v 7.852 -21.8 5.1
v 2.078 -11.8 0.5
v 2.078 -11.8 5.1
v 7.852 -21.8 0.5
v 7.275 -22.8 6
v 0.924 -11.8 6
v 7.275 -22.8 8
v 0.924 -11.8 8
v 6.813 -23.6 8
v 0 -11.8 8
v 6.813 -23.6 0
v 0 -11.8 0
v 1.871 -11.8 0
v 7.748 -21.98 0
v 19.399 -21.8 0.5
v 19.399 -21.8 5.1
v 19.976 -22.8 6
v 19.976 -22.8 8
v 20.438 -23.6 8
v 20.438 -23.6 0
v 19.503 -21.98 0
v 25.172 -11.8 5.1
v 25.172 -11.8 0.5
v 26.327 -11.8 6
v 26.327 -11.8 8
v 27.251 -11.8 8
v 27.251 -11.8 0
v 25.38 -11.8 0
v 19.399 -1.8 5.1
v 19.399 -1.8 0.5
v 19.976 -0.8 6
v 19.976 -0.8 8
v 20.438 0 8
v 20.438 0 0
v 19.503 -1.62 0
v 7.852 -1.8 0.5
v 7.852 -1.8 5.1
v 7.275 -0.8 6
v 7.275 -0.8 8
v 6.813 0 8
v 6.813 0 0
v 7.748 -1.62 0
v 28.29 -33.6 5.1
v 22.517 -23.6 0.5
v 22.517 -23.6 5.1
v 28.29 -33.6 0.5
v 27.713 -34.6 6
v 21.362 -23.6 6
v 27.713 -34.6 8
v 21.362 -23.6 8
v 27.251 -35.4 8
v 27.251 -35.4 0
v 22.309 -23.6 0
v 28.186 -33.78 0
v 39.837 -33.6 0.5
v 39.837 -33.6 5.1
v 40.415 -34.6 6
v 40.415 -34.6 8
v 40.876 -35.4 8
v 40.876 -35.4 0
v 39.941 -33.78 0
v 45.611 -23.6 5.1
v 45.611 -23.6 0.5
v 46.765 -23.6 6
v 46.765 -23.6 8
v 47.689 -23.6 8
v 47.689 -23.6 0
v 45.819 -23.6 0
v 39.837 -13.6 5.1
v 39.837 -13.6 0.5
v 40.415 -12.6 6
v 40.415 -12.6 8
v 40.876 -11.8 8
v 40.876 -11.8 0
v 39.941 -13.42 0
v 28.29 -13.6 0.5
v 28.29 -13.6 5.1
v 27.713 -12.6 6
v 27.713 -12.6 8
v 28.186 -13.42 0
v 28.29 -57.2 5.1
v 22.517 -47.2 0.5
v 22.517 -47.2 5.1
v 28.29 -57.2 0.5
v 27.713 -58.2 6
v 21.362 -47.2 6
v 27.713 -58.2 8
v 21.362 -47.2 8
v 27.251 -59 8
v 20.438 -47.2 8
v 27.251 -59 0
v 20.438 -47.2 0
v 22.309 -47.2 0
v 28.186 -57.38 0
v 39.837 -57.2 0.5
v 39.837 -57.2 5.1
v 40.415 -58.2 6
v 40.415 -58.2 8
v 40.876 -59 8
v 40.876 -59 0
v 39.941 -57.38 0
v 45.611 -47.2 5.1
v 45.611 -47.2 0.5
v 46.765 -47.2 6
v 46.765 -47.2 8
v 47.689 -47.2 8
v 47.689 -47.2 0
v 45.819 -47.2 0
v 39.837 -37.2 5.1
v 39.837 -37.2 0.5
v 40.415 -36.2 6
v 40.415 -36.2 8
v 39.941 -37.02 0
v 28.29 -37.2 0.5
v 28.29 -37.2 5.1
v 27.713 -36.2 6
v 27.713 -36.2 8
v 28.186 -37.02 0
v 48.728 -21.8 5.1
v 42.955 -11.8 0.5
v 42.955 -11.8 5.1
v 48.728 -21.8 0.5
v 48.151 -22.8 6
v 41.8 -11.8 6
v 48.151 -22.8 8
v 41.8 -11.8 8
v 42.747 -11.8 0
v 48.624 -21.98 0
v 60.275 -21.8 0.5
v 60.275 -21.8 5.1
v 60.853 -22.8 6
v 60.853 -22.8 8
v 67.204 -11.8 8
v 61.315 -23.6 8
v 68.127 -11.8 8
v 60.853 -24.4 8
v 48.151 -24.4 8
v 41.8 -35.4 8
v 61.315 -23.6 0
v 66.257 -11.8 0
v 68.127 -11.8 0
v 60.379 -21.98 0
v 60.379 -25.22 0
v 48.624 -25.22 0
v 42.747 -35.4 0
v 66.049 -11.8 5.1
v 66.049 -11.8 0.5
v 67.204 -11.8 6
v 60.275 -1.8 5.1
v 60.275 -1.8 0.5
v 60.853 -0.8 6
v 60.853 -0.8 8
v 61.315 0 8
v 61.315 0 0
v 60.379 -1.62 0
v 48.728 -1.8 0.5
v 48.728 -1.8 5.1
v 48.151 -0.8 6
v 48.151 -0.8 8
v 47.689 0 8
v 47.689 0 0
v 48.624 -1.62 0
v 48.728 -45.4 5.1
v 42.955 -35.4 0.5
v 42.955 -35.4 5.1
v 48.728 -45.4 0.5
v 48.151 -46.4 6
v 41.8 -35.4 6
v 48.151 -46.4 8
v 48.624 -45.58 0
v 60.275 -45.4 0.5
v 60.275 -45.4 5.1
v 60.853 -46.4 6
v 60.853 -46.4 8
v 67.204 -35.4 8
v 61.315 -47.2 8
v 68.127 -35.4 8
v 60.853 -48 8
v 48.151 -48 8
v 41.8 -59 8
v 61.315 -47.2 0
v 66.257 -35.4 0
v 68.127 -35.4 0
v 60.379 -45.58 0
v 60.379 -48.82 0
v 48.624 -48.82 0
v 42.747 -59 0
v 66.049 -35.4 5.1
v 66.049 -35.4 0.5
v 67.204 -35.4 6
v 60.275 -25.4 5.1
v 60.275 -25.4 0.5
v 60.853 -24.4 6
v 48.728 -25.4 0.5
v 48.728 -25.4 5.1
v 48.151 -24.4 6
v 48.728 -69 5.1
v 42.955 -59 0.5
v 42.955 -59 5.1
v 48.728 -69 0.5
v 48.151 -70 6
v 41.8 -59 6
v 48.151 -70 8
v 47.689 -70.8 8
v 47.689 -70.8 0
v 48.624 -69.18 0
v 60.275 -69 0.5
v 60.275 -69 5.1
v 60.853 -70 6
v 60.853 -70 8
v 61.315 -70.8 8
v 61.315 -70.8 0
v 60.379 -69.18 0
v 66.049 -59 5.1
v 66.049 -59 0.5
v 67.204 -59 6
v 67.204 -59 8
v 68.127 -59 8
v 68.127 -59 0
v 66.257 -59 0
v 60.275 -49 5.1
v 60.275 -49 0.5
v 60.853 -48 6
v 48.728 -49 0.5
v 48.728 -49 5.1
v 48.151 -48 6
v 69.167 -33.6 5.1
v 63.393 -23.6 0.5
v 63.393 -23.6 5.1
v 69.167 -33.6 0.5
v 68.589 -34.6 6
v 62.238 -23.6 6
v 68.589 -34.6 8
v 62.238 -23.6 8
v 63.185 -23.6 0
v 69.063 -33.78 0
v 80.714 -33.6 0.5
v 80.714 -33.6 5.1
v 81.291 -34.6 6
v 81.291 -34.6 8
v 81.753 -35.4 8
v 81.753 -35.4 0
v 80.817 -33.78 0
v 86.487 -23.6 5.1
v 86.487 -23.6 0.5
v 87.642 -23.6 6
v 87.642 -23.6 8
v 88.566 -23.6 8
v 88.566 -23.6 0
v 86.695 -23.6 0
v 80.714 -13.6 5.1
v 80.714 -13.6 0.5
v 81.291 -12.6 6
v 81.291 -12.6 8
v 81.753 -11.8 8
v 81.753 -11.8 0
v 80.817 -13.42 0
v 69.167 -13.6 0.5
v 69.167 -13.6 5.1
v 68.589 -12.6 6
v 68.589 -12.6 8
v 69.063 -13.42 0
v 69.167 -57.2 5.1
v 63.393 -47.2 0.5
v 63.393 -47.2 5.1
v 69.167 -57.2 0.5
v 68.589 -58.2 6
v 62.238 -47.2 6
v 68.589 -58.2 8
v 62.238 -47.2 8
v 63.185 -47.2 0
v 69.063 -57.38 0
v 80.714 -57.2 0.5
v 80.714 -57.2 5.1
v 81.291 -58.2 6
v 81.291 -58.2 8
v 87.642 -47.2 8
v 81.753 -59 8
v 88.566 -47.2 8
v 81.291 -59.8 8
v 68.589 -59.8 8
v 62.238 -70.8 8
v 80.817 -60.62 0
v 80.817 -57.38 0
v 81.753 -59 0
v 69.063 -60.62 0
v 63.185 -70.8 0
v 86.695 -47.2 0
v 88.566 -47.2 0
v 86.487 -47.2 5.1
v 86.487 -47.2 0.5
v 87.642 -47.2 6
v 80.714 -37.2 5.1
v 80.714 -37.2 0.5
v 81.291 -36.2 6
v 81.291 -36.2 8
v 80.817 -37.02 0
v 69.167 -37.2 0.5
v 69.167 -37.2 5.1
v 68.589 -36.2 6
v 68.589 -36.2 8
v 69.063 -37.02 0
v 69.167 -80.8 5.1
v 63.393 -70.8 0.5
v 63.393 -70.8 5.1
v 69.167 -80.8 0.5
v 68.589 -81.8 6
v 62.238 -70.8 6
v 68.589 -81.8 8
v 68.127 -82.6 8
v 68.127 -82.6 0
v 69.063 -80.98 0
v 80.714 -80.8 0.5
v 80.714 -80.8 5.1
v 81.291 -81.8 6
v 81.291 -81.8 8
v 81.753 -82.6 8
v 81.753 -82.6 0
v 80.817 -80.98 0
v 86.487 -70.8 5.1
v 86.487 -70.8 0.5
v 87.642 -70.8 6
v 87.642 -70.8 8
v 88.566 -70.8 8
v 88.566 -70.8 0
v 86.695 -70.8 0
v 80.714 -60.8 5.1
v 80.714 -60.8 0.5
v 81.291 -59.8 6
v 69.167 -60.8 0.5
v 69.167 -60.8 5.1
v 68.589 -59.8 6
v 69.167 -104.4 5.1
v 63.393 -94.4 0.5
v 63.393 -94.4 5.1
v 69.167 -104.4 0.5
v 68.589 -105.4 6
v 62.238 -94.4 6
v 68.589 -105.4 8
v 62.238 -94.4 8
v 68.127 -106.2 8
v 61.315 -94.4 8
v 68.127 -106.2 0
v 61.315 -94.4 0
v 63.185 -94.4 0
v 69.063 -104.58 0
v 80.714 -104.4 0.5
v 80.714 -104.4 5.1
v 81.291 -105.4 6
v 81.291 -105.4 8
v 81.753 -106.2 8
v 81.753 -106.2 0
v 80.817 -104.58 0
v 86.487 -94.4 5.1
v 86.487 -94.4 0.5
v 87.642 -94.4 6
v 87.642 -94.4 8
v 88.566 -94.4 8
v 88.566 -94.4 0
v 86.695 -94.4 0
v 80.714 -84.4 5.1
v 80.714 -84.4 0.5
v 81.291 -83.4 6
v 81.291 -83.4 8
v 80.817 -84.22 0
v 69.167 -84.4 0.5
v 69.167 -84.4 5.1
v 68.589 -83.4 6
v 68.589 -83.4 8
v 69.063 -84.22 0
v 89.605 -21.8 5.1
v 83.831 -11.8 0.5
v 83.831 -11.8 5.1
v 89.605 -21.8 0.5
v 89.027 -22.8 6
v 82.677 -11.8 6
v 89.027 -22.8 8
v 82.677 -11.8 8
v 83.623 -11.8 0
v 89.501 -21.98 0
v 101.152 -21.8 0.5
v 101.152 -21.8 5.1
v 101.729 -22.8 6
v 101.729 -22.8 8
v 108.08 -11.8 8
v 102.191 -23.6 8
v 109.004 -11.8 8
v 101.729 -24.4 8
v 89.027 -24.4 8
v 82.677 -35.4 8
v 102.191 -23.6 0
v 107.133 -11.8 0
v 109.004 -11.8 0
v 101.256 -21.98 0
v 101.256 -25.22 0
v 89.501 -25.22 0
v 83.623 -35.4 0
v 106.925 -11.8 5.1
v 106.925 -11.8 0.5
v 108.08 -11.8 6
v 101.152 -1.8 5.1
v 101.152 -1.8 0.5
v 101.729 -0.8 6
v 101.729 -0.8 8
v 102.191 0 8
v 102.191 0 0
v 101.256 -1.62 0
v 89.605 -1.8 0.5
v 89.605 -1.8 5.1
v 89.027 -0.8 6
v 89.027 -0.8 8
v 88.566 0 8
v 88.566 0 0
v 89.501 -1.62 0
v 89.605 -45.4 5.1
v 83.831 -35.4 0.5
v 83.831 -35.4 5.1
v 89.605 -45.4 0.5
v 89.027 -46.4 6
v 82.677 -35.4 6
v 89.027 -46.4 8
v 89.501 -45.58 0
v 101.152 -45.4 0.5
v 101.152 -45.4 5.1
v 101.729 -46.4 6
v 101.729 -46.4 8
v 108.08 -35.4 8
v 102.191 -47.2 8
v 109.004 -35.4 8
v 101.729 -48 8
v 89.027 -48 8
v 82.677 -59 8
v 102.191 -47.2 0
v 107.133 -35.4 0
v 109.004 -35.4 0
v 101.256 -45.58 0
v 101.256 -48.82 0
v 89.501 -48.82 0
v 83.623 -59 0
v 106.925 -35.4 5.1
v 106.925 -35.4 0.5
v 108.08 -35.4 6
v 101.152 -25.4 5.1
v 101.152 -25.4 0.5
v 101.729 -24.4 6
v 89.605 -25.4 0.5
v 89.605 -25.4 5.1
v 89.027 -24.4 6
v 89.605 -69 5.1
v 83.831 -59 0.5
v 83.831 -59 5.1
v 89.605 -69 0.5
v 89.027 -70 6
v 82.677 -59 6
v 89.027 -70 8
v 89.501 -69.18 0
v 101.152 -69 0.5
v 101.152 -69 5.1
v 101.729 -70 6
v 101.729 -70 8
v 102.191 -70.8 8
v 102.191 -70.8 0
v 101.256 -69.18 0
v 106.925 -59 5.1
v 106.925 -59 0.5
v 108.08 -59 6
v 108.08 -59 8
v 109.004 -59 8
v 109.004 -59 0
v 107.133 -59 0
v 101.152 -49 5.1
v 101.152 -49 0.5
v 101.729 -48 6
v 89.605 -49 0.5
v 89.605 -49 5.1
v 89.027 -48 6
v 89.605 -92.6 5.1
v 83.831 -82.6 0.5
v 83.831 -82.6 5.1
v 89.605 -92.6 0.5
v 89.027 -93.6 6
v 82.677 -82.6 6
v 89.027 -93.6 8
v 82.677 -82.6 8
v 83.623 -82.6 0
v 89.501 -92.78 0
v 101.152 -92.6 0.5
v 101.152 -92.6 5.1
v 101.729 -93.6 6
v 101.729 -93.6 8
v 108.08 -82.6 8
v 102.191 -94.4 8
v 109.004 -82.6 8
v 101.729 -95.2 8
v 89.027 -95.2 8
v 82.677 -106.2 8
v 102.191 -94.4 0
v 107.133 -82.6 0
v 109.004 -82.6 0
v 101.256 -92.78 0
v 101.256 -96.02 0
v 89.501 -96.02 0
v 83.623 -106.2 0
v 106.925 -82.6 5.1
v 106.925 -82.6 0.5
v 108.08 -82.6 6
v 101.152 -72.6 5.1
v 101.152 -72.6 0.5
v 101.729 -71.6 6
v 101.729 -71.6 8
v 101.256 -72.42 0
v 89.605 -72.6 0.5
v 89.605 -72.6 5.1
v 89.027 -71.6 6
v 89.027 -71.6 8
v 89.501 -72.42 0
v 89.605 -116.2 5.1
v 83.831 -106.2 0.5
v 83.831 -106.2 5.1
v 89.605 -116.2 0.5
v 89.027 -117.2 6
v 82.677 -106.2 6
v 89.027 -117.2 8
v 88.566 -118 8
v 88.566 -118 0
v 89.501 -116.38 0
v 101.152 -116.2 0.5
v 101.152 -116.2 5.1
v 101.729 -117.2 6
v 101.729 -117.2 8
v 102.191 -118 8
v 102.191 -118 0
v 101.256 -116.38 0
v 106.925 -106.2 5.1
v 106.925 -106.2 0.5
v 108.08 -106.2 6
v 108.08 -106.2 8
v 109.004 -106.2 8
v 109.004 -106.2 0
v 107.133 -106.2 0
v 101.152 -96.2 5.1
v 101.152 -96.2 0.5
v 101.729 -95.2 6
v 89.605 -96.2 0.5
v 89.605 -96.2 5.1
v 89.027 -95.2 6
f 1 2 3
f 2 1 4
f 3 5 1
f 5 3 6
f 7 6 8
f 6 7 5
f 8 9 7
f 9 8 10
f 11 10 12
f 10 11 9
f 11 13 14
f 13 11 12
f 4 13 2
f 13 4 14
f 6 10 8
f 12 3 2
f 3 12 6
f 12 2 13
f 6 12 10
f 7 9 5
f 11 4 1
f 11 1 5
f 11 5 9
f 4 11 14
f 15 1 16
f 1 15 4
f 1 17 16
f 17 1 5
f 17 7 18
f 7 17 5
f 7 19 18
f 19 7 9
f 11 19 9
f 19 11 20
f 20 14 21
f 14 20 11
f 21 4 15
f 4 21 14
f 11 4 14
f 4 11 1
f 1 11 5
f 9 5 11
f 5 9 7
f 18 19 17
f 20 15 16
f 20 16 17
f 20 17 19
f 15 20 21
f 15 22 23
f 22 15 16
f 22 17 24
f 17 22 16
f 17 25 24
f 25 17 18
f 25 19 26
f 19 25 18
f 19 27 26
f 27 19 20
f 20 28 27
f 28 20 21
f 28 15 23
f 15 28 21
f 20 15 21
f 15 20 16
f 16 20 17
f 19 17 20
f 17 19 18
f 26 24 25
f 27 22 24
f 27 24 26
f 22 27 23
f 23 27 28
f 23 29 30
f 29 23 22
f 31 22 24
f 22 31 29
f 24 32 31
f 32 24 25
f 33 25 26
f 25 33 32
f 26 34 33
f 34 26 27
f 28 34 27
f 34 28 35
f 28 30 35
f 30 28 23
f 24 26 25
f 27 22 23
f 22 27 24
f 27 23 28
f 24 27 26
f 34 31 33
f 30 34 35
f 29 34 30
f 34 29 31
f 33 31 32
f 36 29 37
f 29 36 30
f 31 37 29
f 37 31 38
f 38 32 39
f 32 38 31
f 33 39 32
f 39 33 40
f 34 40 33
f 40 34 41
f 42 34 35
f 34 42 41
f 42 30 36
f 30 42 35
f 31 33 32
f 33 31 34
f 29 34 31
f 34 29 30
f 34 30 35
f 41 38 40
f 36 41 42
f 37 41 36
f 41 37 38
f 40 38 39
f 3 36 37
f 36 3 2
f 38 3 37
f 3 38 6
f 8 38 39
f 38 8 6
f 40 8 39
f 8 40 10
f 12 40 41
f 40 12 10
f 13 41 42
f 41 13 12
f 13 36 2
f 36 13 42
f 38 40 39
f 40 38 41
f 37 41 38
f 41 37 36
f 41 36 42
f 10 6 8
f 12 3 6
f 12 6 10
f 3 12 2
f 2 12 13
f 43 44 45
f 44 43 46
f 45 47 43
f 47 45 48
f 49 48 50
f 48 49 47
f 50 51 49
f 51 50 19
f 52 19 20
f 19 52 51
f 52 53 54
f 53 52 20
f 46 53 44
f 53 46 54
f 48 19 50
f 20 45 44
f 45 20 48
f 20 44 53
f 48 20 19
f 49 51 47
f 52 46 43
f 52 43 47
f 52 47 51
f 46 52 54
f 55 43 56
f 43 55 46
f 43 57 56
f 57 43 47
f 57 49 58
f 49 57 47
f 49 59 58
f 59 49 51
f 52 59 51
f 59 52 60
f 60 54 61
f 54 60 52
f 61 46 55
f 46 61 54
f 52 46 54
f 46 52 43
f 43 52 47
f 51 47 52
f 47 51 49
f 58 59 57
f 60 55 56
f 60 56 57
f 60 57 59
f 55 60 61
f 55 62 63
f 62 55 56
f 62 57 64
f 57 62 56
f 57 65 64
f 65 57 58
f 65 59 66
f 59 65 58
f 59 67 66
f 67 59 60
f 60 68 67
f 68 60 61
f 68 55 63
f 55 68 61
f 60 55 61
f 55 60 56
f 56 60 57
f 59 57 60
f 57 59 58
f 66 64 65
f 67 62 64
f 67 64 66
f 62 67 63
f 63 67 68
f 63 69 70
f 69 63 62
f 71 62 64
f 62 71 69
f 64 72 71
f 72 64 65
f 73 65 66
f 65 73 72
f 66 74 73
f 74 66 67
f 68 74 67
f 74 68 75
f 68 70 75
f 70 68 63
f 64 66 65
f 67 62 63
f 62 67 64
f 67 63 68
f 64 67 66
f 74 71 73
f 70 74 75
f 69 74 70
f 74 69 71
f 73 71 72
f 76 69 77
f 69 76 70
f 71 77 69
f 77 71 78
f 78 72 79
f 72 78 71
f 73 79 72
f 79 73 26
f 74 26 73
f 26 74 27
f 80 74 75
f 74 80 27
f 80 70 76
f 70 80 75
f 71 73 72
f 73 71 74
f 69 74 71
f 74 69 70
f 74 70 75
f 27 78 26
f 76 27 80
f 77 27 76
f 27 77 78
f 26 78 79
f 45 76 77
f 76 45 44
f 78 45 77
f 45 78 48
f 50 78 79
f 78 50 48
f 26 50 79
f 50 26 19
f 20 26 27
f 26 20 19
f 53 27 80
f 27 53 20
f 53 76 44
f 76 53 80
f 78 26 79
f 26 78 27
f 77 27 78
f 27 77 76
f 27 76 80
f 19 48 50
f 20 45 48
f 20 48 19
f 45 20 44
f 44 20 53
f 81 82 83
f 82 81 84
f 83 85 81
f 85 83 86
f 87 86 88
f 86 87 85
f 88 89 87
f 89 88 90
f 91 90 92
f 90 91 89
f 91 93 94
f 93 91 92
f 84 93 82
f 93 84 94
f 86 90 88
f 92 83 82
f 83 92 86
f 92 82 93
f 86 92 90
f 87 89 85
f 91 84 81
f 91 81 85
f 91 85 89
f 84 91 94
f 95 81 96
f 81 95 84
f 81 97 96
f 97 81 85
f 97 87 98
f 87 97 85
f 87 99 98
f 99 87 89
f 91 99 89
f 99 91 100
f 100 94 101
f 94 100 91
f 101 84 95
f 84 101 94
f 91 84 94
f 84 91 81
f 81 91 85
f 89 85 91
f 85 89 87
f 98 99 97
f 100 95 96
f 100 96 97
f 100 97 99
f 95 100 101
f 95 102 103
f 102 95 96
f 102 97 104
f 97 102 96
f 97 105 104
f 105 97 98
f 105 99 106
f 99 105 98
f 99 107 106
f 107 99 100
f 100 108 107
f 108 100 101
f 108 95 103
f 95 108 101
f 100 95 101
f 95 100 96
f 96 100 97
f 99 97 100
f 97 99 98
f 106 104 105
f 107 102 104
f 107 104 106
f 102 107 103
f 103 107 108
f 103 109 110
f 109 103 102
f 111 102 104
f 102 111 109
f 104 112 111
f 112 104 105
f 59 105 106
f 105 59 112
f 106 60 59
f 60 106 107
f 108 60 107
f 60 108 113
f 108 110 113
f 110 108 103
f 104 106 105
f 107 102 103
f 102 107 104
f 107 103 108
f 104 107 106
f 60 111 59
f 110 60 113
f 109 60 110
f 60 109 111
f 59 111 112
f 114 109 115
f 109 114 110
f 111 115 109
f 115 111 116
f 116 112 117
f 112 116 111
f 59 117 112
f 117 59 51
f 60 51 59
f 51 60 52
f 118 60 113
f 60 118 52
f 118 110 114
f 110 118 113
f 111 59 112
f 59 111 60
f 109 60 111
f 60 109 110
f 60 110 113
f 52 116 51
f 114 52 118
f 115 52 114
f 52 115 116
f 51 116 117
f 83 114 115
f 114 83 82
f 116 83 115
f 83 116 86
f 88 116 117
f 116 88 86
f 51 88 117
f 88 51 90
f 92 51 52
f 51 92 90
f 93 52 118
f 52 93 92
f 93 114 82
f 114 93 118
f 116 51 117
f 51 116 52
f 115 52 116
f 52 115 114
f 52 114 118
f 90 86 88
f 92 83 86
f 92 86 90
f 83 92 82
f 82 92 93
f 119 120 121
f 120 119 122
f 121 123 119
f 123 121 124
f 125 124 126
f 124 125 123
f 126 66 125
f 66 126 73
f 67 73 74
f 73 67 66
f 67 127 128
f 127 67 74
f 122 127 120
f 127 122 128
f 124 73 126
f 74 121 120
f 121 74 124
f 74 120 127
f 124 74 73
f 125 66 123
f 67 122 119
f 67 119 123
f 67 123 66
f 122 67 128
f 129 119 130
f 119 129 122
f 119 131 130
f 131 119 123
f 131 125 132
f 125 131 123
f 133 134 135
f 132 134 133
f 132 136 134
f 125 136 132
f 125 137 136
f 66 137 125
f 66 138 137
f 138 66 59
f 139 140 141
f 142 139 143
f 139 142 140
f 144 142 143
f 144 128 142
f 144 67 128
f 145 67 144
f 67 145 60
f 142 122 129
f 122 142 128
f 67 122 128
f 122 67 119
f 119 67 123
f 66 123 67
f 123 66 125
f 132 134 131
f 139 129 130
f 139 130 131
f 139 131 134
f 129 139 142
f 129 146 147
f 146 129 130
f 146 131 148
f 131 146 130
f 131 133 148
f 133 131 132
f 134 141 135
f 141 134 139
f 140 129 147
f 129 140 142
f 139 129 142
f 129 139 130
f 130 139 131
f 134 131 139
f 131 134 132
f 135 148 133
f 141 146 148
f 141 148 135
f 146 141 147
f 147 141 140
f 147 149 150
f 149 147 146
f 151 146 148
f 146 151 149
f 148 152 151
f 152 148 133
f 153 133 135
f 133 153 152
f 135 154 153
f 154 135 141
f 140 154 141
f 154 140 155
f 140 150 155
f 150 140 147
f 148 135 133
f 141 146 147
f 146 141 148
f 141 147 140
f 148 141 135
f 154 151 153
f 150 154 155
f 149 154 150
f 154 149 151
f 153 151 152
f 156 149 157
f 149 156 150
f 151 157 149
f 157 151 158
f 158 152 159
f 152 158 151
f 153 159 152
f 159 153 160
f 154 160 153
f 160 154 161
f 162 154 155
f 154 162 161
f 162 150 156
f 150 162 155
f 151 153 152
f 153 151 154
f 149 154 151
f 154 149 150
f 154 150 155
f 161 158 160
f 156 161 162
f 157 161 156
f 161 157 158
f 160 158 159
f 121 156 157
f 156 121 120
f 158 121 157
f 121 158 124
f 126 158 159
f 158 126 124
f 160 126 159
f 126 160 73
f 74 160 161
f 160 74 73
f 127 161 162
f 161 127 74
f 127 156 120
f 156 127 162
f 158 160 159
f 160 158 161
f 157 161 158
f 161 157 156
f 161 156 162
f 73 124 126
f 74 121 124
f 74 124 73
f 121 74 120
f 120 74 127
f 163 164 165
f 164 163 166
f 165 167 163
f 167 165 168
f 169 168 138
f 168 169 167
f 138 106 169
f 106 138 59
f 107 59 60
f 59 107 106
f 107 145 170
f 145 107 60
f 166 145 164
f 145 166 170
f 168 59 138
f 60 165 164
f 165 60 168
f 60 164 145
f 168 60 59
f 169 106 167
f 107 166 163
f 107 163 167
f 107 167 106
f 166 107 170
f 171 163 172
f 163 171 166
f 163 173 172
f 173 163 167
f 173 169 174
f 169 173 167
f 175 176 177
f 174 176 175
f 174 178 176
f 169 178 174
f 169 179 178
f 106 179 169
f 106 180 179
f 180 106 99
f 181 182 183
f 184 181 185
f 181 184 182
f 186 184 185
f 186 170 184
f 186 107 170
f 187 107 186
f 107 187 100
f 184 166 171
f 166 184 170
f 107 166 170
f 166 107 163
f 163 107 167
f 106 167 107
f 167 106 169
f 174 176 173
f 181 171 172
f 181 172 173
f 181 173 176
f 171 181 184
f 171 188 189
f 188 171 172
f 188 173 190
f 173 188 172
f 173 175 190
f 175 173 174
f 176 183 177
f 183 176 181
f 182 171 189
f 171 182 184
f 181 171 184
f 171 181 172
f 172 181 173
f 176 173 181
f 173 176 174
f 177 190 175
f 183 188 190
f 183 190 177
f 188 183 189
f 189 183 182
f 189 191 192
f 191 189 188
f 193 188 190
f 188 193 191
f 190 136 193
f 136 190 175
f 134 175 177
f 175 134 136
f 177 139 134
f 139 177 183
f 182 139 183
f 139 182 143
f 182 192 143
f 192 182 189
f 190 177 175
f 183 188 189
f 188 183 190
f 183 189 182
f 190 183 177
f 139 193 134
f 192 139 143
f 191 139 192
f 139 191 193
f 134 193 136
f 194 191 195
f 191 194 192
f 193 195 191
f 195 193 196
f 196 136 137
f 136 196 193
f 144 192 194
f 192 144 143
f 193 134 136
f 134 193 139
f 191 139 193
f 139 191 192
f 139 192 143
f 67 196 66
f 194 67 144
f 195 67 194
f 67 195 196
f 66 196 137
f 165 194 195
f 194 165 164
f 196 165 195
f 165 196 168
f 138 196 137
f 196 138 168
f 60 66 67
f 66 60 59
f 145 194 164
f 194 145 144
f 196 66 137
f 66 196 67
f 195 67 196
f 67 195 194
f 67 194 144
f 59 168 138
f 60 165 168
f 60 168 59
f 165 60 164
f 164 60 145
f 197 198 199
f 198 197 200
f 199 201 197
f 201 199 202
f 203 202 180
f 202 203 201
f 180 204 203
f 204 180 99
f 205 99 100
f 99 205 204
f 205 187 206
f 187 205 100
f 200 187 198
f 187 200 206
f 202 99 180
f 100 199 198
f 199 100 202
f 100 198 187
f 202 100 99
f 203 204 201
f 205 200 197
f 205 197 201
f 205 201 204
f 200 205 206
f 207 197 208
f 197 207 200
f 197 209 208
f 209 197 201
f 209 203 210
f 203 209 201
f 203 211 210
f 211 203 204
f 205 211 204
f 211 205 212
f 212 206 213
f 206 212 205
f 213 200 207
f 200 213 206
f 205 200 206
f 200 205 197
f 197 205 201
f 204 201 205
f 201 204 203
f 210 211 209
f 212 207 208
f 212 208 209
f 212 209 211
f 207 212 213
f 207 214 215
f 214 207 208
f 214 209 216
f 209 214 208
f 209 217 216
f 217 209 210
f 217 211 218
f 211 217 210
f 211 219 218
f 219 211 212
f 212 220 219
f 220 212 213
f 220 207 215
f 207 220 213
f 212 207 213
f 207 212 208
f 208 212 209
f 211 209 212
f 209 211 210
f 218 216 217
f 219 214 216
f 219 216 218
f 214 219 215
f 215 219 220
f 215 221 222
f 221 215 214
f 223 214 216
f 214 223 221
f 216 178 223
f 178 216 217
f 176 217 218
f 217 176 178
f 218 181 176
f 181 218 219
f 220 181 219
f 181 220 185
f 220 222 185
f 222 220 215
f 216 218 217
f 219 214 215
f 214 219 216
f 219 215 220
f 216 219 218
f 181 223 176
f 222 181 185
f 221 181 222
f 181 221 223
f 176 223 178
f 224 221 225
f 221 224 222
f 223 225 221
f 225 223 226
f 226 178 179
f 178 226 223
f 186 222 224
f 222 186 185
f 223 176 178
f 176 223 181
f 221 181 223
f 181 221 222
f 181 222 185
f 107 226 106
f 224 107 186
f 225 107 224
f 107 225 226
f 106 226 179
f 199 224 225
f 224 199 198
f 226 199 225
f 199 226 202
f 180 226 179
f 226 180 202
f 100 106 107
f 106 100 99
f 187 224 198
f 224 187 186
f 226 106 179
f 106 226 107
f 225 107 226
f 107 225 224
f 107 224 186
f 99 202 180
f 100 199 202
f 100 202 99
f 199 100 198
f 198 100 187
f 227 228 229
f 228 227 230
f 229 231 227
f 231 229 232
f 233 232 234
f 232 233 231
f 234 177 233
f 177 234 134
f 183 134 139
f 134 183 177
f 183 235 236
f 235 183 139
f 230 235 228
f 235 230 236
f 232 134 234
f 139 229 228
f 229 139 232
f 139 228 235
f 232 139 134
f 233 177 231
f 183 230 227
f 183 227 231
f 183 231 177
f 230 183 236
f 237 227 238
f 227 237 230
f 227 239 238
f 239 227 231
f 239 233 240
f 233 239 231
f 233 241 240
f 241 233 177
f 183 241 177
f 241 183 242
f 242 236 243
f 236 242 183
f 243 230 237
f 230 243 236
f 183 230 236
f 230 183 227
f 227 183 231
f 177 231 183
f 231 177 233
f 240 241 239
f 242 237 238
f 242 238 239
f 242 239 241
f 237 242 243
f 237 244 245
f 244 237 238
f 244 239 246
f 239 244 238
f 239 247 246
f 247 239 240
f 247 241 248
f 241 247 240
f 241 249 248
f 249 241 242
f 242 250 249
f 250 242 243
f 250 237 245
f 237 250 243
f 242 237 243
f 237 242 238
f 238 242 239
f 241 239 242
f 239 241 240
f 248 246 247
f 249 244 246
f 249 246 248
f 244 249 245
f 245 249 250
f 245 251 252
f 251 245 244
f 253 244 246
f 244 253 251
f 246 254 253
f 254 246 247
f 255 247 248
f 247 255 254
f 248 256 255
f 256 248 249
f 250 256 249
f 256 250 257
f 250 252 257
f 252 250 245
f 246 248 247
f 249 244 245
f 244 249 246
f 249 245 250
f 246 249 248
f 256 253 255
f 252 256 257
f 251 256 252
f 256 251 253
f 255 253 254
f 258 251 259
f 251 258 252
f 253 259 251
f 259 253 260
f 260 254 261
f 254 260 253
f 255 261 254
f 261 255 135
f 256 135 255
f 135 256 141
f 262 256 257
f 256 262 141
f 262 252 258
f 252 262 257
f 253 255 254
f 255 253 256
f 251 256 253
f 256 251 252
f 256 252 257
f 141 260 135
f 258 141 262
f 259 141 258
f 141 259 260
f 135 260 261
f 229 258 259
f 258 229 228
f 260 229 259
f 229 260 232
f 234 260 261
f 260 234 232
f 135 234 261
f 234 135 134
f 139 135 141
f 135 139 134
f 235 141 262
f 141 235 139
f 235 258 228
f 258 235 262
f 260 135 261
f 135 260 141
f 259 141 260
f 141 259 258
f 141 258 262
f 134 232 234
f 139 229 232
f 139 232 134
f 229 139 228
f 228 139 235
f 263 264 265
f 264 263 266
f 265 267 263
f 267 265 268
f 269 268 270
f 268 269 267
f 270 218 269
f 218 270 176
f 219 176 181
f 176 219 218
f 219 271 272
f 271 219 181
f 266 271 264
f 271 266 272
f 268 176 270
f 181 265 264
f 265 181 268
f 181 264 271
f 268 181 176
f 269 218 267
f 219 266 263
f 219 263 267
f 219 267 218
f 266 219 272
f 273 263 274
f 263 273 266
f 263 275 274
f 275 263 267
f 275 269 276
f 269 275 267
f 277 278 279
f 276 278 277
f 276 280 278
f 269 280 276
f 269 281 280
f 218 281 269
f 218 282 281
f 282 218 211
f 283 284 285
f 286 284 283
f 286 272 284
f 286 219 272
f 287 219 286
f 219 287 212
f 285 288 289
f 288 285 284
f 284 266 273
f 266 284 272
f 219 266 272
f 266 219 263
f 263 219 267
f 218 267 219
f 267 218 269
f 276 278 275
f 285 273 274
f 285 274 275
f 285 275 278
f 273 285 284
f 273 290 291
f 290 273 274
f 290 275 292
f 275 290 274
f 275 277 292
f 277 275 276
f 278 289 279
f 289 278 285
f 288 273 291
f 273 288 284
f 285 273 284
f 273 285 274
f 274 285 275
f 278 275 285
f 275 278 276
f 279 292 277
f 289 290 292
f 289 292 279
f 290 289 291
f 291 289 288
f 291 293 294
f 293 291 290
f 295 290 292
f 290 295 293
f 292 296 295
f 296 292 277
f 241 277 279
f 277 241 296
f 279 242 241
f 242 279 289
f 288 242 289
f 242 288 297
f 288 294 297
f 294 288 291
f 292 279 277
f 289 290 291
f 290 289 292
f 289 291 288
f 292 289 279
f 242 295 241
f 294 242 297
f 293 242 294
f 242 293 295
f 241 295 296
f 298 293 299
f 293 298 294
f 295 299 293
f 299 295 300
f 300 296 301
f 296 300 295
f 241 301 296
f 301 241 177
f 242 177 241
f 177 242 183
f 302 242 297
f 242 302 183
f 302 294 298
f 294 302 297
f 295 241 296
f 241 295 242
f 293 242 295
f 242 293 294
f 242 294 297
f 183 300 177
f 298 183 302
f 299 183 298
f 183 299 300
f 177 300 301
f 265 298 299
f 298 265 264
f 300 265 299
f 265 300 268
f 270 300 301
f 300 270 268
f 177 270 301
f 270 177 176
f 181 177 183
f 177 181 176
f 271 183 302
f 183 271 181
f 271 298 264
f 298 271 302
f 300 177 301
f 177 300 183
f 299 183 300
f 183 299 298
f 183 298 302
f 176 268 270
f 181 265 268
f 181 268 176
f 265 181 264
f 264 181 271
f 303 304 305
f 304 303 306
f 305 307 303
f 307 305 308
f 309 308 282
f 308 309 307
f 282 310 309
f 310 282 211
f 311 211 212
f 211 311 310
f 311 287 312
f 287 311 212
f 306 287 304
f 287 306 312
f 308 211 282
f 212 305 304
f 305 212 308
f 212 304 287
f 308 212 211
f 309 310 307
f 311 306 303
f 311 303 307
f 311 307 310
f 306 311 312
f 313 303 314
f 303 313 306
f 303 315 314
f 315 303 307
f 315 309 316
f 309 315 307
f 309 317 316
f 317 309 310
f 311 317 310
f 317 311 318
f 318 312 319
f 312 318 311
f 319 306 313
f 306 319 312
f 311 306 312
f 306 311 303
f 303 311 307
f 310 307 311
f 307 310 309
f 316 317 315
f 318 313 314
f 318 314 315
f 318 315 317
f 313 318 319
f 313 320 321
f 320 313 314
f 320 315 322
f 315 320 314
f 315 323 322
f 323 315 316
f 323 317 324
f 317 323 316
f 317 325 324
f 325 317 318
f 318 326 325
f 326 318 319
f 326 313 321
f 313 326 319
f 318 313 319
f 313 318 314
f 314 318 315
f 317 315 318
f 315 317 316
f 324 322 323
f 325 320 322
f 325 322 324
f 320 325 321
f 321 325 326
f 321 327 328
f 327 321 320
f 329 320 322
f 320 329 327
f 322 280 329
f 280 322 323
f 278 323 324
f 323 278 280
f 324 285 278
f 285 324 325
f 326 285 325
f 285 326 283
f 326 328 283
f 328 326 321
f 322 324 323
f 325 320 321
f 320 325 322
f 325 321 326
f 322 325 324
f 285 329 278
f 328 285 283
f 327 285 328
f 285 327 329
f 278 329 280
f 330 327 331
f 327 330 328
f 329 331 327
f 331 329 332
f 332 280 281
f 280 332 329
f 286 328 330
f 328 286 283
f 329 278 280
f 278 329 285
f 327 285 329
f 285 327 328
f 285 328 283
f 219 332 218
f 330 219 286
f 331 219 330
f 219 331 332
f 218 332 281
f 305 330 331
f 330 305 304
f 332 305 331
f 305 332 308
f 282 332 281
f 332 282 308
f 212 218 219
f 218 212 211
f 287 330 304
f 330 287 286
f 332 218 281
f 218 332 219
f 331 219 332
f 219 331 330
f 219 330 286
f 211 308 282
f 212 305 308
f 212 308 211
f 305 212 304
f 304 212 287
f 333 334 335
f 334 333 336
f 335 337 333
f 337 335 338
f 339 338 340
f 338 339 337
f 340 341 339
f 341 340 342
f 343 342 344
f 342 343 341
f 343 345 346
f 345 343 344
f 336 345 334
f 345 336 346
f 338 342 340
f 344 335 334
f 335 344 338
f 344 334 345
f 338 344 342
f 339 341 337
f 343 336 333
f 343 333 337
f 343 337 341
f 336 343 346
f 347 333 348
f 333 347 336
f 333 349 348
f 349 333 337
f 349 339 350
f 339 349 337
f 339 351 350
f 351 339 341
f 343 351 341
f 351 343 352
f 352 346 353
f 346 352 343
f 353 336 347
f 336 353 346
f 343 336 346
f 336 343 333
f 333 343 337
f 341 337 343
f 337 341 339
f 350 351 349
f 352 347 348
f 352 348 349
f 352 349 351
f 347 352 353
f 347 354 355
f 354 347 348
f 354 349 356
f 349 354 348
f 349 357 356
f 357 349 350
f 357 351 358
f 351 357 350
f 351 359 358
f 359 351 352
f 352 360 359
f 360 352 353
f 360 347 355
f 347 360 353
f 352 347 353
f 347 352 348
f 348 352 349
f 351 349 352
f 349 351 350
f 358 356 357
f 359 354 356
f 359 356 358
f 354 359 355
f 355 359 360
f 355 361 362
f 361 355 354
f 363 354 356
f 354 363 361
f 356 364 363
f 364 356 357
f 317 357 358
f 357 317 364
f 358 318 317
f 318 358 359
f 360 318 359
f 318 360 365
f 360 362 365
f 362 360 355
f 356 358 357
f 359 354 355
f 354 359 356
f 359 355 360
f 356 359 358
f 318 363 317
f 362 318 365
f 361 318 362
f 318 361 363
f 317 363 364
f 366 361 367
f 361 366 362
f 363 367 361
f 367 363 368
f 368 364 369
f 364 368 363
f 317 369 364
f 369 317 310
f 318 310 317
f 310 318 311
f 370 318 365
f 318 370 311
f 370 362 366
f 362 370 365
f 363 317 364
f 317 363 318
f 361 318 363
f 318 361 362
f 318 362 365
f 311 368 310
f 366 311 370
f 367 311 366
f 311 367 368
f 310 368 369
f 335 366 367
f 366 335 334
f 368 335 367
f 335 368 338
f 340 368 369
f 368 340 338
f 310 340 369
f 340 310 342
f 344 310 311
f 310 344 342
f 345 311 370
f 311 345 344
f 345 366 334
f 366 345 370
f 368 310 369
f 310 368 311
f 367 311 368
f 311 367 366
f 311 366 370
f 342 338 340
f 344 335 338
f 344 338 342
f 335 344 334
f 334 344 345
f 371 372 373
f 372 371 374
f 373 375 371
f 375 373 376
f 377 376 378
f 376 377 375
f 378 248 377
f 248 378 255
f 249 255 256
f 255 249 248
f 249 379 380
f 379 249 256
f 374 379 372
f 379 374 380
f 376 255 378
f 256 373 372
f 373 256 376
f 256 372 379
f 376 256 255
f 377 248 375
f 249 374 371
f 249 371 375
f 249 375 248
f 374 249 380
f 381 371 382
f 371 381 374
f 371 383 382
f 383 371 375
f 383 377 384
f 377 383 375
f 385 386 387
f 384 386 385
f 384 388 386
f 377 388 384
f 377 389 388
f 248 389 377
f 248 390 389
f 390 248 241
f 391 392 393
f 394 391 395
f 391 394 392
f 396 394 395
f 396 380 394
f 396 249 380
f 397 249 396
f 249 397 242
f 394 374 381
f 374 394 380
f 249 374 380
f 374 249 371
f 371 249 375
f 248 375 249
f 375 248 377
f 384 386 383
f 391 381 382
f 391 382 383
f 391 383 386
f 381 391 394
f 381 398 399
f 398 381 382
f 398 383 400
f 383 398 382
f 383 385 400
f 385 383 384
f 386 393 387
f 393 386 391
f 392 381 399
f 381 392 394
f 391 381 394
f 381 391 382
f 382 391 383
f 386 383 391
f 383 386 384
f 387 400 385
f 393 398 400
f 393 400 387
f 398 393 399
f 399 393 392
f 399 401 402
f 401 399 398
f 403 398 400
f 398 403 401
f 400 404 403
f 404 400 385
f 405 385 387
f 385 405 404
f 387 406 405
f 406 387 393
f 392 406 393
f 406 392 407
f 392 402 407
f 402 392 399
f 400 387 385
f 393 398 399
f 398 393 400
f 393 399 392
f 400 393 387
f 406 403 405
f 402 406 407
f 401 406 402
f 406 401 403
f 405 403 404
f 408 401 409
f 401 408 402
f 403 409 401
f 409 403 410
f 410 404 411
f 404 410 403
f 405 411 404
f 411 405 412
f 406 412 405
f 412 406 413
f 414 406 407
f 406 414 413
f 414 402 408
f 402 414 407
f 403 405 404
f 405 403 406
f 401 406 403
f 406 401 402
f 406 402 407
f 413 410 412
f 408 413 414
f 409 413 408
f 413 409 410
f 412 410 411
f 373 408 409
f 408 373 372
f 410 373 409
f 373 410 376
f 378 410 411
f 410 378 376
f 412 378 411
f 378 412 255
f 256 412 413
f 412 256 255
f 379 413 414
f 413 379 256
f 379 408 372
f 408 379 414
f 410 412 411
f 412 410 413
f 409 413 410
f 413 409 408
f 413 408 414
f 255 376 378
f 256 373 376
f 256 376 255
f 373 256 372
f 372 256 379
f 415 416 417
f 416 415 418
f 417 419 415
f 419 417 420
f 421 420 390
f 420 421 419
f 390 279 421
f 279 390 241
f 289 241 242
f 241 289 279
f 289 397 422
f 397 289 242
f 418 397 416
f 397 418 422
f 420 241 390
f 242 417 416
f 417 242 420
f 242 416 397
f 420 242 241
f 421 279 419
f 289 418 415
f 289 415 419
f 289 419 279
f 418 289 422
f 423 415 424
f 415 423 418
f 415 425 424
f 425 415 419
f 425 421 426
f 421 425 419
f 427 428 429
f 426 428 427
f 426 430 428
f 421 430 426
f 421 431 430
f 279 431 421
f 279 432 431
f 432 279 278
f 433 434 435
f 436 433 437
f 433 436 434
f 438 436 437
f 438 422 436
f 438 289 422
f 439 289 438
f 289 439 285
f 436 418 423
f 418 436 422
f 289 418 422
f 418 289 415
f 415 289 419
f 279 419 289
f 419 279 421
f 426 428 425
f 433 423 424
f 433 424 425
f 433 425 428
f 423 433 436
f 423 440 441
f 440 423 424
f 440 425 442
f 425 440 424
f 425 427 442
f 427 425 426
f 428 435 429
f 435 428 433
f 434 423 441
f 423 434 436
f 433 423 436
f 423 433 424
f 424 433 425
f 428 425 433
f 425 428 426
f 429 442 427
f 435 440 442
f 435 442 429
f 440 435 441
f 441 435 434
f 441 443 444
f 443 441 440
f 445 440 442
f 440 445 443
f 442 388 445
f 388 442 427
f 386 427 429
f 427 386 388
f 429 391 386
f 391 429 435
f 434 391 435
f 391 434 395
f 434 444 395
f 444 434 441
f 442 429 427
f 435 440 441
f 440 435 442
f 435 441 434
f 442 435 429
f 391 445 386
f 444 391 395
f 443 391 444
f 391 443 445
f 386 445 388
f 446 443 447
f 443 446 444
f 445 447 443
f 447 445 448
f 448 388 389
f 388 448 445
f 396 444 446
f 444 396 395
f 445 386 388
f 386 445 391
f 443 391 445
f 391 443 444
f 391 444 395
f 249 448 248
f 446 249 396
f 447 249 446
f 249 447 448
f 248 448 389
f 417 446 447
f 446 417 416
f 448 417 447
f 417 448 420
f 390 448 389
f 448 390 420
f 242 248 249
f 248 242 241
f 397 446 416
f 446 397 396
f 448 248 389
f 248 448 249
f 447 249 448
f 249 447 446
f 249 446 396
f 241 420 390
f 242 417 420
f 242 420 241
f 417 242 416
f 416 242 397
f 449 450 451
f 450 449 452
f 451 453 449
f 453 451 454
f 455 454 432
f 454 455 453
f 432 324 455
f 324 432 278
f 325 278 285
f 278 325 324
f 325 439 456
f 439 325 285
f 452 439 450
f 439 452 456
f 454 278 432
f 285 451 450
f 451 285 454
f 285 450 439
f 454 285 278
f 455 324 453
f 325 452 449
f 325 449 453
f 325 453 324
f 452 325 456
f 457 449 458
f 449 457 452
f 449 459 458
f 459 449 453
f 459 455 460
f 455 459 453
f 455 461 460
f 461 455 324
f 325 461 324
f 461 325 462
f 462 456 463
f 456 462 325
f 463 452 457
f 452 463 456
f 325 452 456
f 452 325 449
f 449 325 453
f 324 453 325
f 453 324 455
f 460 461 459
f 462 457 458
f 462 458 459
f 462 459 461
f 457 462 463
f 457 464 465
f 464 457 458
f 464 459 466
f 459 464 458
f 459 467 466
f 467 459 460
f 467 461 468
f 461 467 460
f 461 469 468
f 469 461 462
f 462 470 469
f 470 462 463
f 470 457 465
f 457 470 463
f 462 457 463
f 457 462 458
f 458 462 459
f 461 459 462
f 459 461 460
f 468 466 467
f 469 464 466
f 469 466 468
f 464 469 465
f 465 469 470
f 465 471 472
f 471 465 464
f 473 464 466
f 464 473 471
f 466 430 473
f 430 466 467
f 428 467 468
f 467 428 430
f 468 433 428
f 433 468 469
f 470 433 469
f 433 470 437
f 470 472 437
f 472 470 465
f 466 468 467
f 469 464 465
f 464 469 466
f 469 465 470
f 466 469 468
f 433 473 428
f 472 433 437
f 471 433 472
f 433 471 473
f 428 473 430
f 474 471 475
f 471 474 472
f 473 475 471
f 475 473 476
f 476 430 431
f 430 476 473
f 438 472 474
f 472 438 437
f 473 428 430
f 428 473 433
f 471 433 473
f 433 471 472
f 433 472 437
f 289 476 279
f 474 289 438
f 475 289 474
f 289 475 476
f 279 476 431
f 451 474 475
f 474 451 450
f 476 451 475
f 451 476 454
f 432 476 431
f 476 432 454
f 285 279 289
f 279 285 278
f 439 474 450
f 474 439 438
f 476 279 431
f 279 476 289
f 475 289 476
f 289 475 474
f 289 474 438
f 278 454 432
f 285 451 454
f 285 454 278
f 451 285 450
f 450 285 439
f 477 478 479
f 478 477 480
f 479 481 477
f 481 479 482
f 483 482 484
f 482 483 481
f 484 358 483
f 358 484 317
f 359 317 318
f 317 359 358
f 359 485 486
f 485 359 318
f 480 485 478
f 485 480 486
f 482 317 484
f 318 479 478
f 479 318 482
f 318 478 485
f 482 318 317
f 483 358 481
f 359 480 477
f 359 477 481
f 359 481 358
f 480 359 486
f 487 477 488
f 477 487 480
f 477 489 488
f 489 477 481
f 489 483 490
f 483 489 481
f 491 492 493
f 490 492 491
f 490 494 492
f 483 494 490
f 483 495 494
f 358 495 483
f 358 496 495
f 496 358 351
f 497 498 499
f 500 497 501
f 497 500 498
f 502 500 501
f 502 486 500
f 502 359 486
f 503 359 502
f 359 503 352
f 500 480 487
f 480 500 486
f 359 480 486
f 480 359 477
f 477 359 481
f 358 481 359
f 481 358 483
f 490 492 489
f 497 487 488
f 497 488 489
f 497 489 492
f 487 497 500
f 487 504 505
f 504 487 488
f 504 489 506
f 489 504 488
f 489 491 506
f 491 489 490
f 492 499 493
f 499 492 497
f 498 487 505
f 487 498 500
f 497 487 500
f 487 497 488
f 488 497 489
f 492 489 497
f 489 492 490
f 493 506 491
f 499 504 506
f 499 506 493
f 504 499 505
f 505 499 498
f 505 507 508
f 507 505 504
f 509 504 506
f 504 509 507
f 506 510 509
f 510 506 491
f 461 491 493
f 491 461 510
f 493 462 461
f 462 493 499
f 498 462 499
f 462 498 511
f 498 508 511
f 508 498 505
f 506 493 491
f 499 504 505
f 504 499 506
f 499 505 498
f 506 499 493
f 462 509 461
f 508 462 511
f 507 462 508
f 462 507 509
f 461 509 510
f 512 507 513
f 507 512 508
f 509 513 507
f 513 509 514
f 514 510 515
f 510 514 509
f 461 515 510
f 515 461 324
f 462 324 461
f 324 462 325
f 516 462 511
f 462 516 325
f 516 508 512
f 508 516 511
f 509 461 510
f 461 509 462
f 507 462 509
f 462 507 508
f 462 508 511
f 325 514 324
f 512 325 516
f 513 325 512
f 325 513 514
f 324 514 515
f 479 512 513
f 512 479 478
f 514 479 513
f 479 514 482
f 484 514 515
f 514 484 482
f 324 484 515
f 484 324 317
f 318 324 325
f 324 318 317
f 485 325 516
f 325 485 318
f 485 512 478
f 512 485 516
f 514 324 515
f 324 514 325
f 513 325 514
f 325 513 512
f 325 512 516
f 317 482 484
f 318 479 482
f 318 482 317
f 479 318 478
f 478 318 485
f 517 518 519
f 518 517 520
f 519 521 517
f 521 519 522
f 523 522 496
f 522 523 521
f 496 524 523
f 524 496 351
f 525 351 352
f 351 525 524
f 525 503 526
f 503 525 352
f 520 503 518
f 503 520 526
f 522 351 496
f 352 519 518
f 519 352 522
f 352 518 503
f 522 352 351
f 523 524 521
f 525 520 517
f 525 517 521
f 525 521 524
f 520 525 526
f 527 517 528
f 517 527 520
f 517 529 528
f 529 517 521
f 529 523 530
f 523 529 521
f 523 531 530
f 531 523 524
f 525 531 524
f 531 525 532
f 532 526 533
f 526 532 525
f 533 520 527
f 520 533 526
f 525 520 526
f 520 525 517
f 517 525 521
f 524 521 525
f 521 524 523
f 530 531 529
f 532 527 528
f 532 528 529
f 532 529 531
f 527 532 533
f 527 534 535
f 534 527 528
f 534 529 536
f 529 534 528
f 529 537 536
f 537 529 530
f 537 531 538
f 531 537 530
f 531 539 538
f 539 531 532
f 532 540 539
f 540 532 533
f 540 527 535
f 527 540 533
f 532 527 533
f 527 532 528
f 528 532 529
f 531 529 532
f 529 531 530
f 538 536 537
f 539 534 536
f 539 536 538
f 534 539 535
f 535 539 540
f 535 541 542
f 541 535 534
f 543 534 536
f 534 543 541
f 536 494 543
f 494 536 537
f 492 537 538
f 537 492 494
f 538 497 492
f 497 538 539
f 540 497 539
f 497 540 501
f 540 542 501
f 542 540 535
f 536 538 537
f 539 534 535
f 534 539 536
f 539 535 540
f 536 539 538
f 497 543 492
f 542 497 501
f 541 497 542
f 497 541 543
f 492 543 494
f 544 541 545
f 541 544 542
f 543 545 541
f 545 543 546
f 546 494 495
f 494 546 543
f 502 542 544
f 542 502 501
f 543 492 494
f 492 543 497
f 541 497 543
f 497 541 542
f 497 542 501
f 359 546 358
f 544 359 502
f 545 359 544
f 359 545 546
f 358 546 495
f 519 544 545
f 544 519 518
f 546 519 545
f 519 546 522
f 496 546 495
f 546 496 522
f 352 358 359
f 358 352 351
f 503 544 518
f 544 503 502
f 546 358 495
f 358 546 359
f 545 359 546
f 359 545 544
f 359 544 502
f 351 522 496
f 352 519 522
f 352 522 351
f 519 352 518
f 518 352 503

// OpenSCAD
/*[ Hex unit size ]*/

//Depth of the grid
depth = 8;
//Width of the hexagon's hole (flat side to flat side)
hole_width = 20;
//Thickness of the wall forming each hexagon
wall_thickness = 1.8;

/*[ Grid size settings ]*/
max_grid_width=100;
max_grid_height=100;

/*[ Grid shape ]*/
//If checked, ignores custom column sizes and fills grid to maximum size.
fill=false;;
flip_staggering=false;
//Amount of hexagons per column. Each entry defines a one column, where the number specifies the amount of hex units that will be generated for the respective column. (Ignored if "fill" is checked)
columns=[1,2,3,4,5];
include_offsets=false;
//Optional: Offset for each column. This will ignore grid size limits.
column_offsets=[0,-2,-3,-1,0,2,4];
include_gaps=false;
//Optional: Gaps for each column. *NOTE: Change these values in the code. Seems like 2D vector parameters aren't supported by the parameter editor and are always overwritten by the defaults.
column_gaps=[[], [3,4], [4,5], [2]];

/*[ Flat edges ]*/
edge_left = false;
edge_top = false;
edge_right = false;
edge_bottom = false;


//Calculated global variables
//Hexagon dimensions
hex_inner_r = hole_width/sqrt(3); //Inner radius/side length (center to point)
hex_h=hole_width+wall_thickness*2; //Outer side to side distance
hex_s=hex_h/sqrt(3); //Outer radius/side length 
hex_d=2*hex_s; //Outer diameter (point to point)
hex_t=hex_s/2;
//Grid dimensions
max_grid_hexagons_x = fill? floor(max_grid_width/(hex_d-hex_t) +(edge_left?0.5:0) +(edge_right?0.5:0)): len(columns);
max_grid_hexagons_y = fill? floor(max_grid_height/hex_h +(edge_top?0.5:0) +(edge_bottom?0.5:0)): max(columns);
max_grid_hexagons_y_lo = fill? floor(max_grid_height/hex_h - 0.5 +(edge_top?0.5:0) +(edge_bottom?0.5:0)): (max(columns) - 0.5);
total_width = max_grid_hexagons_x * (hex_d-hex_t) + hex_t;
total_height = hex_h*max(max_grid_hexagons_y - 0.5, max_grid_hexagons_y_lo);


translate([edge_left?0:hex_s, edge_top?0:-hex_h/2, 0])
grid(columns, include_offsets?column_offsets:[], include_gaps?column_gaps:[], depth, hole_width, wall_thickness, fill);


module grid(cols, offsets, gaps, height, hole_width, wall_width, fill){    
    for(hcol = [0:fill?max_grid_hexagons_x-1:(len(cols)-1)]){
        for(hrow = [0:(fill?(max_grid_hexagons_y-1):(cols[hcol]-1))]) {
            skip = hcol<len(gaps) && len(search(hrow+1, gaps[hcol])) > 0;          
            if(!skip){
                offset_value=hcol>len(offsets)-1?0:offsets[hcol];
                
                lo = (hcol+(flip_staggering?1:0))%2;
                x = (hex_d-hex_t)*hcol;
                y = -(hex_h)*(hrow + offset_value + lo/2);                
                
                if(hcol<max_grid_hexagons_x && hrow<(lo==0?max_grid_hexagons_y:max_grid_hexagons_y_lo)){
                    left = edge_left && hcol==0;
                    top = edge_top && hrow==0 && hcol%2==(flip_staggering?1:0);
                    right = edge_right && hcol==max_grid_hexagons_x-1;
                    bottom = edge_bottom && hrow+1==(lo==0?max_grid_hexagons_y:max_grid_hexagons_y_lo) && -y+hex_h>total_height+0.001 && -y+hex_h/2<=total_height;
                    translate([x, y, 0]) halfhex(height, hex_s, wall_width, hole_width, left, top, right, bottom);
                }
            }        
        }
    }
}

module halfhex(height, radius, wall_thickness, hole_width, left, top, right, bottom){
    difference(){
        union(){
            hex(height, radius, wall_thickness, hole_width);
            if(left) translate([0, hex_h/2, 0]) wall(depth, wall_thickness, hex_h);
            if(top) translate([hex_d/2, 0, 0]) rotate([0,0,-90]) wall(depth, wall_thickness, hex_d);
            if(right) translate([0, -hex_h/2, 0]) rotate([0,0,180]) wall(depth, wall_thickness, hex_h);
            if(bottom) translate([-hex_d/2, 0, 0]) rotate([0,0,90]) wall(depth, wall_thickness, hex_d);
        }
        if(left) translate([-hex_d/2, -hex_h, 0]) cube([hex_d/2, 2*hex_h, depth]);
        if(top) translate([-hex_d/2, 0, 0]) cube([hex_d, hex_h, depth]);
        if(right) translate([0, -hex_h, 0]) cube([hex_d/2, 2*hex_h, depth]);
        if(bottom) translate([-hex_d/2, -hex_h, 0]) cube([hex_d, hex_h, depth]);
    }
}

module hex(height, radius, wall_thickness, hole_width){
    for(i=[0:5]){
        rotate([0,0,i*60+30])
        translate([-hole_width/2-wall_thickness, radius/2, 0])
        wall(height, wall_thickness, radius);
    }
}

module wall(height, wall_thickness, length){
    hmax=height;
    hmin=5.1;
    hd=2;
    tmax=wall_thickness;
    tmin=wall_thickness-1;   
    ft = 0.18;//fillet thickness
    fh = 0.5;//fillet height
    color("blue")
    difference(){
        color([0,0,1])
        rotate([90,0,0])
            linear_extrude(length)   
            polygon([[0,0], [0,hmax], [tmin,hmax], [tmin,hmax-hd], [tmax,hmin], [tmax,fh], [tmax-ft,0]]);
        //Fillet
        rotate([0,0,-30])
            cube([4*tmax, 2*tmax, hmax]);
        mirror([0,1,0])
            translate([0,length,0])
            rotate([0,0,-30])
            cube([4*tmax, 2*tmax, hmax]);
    }
}
